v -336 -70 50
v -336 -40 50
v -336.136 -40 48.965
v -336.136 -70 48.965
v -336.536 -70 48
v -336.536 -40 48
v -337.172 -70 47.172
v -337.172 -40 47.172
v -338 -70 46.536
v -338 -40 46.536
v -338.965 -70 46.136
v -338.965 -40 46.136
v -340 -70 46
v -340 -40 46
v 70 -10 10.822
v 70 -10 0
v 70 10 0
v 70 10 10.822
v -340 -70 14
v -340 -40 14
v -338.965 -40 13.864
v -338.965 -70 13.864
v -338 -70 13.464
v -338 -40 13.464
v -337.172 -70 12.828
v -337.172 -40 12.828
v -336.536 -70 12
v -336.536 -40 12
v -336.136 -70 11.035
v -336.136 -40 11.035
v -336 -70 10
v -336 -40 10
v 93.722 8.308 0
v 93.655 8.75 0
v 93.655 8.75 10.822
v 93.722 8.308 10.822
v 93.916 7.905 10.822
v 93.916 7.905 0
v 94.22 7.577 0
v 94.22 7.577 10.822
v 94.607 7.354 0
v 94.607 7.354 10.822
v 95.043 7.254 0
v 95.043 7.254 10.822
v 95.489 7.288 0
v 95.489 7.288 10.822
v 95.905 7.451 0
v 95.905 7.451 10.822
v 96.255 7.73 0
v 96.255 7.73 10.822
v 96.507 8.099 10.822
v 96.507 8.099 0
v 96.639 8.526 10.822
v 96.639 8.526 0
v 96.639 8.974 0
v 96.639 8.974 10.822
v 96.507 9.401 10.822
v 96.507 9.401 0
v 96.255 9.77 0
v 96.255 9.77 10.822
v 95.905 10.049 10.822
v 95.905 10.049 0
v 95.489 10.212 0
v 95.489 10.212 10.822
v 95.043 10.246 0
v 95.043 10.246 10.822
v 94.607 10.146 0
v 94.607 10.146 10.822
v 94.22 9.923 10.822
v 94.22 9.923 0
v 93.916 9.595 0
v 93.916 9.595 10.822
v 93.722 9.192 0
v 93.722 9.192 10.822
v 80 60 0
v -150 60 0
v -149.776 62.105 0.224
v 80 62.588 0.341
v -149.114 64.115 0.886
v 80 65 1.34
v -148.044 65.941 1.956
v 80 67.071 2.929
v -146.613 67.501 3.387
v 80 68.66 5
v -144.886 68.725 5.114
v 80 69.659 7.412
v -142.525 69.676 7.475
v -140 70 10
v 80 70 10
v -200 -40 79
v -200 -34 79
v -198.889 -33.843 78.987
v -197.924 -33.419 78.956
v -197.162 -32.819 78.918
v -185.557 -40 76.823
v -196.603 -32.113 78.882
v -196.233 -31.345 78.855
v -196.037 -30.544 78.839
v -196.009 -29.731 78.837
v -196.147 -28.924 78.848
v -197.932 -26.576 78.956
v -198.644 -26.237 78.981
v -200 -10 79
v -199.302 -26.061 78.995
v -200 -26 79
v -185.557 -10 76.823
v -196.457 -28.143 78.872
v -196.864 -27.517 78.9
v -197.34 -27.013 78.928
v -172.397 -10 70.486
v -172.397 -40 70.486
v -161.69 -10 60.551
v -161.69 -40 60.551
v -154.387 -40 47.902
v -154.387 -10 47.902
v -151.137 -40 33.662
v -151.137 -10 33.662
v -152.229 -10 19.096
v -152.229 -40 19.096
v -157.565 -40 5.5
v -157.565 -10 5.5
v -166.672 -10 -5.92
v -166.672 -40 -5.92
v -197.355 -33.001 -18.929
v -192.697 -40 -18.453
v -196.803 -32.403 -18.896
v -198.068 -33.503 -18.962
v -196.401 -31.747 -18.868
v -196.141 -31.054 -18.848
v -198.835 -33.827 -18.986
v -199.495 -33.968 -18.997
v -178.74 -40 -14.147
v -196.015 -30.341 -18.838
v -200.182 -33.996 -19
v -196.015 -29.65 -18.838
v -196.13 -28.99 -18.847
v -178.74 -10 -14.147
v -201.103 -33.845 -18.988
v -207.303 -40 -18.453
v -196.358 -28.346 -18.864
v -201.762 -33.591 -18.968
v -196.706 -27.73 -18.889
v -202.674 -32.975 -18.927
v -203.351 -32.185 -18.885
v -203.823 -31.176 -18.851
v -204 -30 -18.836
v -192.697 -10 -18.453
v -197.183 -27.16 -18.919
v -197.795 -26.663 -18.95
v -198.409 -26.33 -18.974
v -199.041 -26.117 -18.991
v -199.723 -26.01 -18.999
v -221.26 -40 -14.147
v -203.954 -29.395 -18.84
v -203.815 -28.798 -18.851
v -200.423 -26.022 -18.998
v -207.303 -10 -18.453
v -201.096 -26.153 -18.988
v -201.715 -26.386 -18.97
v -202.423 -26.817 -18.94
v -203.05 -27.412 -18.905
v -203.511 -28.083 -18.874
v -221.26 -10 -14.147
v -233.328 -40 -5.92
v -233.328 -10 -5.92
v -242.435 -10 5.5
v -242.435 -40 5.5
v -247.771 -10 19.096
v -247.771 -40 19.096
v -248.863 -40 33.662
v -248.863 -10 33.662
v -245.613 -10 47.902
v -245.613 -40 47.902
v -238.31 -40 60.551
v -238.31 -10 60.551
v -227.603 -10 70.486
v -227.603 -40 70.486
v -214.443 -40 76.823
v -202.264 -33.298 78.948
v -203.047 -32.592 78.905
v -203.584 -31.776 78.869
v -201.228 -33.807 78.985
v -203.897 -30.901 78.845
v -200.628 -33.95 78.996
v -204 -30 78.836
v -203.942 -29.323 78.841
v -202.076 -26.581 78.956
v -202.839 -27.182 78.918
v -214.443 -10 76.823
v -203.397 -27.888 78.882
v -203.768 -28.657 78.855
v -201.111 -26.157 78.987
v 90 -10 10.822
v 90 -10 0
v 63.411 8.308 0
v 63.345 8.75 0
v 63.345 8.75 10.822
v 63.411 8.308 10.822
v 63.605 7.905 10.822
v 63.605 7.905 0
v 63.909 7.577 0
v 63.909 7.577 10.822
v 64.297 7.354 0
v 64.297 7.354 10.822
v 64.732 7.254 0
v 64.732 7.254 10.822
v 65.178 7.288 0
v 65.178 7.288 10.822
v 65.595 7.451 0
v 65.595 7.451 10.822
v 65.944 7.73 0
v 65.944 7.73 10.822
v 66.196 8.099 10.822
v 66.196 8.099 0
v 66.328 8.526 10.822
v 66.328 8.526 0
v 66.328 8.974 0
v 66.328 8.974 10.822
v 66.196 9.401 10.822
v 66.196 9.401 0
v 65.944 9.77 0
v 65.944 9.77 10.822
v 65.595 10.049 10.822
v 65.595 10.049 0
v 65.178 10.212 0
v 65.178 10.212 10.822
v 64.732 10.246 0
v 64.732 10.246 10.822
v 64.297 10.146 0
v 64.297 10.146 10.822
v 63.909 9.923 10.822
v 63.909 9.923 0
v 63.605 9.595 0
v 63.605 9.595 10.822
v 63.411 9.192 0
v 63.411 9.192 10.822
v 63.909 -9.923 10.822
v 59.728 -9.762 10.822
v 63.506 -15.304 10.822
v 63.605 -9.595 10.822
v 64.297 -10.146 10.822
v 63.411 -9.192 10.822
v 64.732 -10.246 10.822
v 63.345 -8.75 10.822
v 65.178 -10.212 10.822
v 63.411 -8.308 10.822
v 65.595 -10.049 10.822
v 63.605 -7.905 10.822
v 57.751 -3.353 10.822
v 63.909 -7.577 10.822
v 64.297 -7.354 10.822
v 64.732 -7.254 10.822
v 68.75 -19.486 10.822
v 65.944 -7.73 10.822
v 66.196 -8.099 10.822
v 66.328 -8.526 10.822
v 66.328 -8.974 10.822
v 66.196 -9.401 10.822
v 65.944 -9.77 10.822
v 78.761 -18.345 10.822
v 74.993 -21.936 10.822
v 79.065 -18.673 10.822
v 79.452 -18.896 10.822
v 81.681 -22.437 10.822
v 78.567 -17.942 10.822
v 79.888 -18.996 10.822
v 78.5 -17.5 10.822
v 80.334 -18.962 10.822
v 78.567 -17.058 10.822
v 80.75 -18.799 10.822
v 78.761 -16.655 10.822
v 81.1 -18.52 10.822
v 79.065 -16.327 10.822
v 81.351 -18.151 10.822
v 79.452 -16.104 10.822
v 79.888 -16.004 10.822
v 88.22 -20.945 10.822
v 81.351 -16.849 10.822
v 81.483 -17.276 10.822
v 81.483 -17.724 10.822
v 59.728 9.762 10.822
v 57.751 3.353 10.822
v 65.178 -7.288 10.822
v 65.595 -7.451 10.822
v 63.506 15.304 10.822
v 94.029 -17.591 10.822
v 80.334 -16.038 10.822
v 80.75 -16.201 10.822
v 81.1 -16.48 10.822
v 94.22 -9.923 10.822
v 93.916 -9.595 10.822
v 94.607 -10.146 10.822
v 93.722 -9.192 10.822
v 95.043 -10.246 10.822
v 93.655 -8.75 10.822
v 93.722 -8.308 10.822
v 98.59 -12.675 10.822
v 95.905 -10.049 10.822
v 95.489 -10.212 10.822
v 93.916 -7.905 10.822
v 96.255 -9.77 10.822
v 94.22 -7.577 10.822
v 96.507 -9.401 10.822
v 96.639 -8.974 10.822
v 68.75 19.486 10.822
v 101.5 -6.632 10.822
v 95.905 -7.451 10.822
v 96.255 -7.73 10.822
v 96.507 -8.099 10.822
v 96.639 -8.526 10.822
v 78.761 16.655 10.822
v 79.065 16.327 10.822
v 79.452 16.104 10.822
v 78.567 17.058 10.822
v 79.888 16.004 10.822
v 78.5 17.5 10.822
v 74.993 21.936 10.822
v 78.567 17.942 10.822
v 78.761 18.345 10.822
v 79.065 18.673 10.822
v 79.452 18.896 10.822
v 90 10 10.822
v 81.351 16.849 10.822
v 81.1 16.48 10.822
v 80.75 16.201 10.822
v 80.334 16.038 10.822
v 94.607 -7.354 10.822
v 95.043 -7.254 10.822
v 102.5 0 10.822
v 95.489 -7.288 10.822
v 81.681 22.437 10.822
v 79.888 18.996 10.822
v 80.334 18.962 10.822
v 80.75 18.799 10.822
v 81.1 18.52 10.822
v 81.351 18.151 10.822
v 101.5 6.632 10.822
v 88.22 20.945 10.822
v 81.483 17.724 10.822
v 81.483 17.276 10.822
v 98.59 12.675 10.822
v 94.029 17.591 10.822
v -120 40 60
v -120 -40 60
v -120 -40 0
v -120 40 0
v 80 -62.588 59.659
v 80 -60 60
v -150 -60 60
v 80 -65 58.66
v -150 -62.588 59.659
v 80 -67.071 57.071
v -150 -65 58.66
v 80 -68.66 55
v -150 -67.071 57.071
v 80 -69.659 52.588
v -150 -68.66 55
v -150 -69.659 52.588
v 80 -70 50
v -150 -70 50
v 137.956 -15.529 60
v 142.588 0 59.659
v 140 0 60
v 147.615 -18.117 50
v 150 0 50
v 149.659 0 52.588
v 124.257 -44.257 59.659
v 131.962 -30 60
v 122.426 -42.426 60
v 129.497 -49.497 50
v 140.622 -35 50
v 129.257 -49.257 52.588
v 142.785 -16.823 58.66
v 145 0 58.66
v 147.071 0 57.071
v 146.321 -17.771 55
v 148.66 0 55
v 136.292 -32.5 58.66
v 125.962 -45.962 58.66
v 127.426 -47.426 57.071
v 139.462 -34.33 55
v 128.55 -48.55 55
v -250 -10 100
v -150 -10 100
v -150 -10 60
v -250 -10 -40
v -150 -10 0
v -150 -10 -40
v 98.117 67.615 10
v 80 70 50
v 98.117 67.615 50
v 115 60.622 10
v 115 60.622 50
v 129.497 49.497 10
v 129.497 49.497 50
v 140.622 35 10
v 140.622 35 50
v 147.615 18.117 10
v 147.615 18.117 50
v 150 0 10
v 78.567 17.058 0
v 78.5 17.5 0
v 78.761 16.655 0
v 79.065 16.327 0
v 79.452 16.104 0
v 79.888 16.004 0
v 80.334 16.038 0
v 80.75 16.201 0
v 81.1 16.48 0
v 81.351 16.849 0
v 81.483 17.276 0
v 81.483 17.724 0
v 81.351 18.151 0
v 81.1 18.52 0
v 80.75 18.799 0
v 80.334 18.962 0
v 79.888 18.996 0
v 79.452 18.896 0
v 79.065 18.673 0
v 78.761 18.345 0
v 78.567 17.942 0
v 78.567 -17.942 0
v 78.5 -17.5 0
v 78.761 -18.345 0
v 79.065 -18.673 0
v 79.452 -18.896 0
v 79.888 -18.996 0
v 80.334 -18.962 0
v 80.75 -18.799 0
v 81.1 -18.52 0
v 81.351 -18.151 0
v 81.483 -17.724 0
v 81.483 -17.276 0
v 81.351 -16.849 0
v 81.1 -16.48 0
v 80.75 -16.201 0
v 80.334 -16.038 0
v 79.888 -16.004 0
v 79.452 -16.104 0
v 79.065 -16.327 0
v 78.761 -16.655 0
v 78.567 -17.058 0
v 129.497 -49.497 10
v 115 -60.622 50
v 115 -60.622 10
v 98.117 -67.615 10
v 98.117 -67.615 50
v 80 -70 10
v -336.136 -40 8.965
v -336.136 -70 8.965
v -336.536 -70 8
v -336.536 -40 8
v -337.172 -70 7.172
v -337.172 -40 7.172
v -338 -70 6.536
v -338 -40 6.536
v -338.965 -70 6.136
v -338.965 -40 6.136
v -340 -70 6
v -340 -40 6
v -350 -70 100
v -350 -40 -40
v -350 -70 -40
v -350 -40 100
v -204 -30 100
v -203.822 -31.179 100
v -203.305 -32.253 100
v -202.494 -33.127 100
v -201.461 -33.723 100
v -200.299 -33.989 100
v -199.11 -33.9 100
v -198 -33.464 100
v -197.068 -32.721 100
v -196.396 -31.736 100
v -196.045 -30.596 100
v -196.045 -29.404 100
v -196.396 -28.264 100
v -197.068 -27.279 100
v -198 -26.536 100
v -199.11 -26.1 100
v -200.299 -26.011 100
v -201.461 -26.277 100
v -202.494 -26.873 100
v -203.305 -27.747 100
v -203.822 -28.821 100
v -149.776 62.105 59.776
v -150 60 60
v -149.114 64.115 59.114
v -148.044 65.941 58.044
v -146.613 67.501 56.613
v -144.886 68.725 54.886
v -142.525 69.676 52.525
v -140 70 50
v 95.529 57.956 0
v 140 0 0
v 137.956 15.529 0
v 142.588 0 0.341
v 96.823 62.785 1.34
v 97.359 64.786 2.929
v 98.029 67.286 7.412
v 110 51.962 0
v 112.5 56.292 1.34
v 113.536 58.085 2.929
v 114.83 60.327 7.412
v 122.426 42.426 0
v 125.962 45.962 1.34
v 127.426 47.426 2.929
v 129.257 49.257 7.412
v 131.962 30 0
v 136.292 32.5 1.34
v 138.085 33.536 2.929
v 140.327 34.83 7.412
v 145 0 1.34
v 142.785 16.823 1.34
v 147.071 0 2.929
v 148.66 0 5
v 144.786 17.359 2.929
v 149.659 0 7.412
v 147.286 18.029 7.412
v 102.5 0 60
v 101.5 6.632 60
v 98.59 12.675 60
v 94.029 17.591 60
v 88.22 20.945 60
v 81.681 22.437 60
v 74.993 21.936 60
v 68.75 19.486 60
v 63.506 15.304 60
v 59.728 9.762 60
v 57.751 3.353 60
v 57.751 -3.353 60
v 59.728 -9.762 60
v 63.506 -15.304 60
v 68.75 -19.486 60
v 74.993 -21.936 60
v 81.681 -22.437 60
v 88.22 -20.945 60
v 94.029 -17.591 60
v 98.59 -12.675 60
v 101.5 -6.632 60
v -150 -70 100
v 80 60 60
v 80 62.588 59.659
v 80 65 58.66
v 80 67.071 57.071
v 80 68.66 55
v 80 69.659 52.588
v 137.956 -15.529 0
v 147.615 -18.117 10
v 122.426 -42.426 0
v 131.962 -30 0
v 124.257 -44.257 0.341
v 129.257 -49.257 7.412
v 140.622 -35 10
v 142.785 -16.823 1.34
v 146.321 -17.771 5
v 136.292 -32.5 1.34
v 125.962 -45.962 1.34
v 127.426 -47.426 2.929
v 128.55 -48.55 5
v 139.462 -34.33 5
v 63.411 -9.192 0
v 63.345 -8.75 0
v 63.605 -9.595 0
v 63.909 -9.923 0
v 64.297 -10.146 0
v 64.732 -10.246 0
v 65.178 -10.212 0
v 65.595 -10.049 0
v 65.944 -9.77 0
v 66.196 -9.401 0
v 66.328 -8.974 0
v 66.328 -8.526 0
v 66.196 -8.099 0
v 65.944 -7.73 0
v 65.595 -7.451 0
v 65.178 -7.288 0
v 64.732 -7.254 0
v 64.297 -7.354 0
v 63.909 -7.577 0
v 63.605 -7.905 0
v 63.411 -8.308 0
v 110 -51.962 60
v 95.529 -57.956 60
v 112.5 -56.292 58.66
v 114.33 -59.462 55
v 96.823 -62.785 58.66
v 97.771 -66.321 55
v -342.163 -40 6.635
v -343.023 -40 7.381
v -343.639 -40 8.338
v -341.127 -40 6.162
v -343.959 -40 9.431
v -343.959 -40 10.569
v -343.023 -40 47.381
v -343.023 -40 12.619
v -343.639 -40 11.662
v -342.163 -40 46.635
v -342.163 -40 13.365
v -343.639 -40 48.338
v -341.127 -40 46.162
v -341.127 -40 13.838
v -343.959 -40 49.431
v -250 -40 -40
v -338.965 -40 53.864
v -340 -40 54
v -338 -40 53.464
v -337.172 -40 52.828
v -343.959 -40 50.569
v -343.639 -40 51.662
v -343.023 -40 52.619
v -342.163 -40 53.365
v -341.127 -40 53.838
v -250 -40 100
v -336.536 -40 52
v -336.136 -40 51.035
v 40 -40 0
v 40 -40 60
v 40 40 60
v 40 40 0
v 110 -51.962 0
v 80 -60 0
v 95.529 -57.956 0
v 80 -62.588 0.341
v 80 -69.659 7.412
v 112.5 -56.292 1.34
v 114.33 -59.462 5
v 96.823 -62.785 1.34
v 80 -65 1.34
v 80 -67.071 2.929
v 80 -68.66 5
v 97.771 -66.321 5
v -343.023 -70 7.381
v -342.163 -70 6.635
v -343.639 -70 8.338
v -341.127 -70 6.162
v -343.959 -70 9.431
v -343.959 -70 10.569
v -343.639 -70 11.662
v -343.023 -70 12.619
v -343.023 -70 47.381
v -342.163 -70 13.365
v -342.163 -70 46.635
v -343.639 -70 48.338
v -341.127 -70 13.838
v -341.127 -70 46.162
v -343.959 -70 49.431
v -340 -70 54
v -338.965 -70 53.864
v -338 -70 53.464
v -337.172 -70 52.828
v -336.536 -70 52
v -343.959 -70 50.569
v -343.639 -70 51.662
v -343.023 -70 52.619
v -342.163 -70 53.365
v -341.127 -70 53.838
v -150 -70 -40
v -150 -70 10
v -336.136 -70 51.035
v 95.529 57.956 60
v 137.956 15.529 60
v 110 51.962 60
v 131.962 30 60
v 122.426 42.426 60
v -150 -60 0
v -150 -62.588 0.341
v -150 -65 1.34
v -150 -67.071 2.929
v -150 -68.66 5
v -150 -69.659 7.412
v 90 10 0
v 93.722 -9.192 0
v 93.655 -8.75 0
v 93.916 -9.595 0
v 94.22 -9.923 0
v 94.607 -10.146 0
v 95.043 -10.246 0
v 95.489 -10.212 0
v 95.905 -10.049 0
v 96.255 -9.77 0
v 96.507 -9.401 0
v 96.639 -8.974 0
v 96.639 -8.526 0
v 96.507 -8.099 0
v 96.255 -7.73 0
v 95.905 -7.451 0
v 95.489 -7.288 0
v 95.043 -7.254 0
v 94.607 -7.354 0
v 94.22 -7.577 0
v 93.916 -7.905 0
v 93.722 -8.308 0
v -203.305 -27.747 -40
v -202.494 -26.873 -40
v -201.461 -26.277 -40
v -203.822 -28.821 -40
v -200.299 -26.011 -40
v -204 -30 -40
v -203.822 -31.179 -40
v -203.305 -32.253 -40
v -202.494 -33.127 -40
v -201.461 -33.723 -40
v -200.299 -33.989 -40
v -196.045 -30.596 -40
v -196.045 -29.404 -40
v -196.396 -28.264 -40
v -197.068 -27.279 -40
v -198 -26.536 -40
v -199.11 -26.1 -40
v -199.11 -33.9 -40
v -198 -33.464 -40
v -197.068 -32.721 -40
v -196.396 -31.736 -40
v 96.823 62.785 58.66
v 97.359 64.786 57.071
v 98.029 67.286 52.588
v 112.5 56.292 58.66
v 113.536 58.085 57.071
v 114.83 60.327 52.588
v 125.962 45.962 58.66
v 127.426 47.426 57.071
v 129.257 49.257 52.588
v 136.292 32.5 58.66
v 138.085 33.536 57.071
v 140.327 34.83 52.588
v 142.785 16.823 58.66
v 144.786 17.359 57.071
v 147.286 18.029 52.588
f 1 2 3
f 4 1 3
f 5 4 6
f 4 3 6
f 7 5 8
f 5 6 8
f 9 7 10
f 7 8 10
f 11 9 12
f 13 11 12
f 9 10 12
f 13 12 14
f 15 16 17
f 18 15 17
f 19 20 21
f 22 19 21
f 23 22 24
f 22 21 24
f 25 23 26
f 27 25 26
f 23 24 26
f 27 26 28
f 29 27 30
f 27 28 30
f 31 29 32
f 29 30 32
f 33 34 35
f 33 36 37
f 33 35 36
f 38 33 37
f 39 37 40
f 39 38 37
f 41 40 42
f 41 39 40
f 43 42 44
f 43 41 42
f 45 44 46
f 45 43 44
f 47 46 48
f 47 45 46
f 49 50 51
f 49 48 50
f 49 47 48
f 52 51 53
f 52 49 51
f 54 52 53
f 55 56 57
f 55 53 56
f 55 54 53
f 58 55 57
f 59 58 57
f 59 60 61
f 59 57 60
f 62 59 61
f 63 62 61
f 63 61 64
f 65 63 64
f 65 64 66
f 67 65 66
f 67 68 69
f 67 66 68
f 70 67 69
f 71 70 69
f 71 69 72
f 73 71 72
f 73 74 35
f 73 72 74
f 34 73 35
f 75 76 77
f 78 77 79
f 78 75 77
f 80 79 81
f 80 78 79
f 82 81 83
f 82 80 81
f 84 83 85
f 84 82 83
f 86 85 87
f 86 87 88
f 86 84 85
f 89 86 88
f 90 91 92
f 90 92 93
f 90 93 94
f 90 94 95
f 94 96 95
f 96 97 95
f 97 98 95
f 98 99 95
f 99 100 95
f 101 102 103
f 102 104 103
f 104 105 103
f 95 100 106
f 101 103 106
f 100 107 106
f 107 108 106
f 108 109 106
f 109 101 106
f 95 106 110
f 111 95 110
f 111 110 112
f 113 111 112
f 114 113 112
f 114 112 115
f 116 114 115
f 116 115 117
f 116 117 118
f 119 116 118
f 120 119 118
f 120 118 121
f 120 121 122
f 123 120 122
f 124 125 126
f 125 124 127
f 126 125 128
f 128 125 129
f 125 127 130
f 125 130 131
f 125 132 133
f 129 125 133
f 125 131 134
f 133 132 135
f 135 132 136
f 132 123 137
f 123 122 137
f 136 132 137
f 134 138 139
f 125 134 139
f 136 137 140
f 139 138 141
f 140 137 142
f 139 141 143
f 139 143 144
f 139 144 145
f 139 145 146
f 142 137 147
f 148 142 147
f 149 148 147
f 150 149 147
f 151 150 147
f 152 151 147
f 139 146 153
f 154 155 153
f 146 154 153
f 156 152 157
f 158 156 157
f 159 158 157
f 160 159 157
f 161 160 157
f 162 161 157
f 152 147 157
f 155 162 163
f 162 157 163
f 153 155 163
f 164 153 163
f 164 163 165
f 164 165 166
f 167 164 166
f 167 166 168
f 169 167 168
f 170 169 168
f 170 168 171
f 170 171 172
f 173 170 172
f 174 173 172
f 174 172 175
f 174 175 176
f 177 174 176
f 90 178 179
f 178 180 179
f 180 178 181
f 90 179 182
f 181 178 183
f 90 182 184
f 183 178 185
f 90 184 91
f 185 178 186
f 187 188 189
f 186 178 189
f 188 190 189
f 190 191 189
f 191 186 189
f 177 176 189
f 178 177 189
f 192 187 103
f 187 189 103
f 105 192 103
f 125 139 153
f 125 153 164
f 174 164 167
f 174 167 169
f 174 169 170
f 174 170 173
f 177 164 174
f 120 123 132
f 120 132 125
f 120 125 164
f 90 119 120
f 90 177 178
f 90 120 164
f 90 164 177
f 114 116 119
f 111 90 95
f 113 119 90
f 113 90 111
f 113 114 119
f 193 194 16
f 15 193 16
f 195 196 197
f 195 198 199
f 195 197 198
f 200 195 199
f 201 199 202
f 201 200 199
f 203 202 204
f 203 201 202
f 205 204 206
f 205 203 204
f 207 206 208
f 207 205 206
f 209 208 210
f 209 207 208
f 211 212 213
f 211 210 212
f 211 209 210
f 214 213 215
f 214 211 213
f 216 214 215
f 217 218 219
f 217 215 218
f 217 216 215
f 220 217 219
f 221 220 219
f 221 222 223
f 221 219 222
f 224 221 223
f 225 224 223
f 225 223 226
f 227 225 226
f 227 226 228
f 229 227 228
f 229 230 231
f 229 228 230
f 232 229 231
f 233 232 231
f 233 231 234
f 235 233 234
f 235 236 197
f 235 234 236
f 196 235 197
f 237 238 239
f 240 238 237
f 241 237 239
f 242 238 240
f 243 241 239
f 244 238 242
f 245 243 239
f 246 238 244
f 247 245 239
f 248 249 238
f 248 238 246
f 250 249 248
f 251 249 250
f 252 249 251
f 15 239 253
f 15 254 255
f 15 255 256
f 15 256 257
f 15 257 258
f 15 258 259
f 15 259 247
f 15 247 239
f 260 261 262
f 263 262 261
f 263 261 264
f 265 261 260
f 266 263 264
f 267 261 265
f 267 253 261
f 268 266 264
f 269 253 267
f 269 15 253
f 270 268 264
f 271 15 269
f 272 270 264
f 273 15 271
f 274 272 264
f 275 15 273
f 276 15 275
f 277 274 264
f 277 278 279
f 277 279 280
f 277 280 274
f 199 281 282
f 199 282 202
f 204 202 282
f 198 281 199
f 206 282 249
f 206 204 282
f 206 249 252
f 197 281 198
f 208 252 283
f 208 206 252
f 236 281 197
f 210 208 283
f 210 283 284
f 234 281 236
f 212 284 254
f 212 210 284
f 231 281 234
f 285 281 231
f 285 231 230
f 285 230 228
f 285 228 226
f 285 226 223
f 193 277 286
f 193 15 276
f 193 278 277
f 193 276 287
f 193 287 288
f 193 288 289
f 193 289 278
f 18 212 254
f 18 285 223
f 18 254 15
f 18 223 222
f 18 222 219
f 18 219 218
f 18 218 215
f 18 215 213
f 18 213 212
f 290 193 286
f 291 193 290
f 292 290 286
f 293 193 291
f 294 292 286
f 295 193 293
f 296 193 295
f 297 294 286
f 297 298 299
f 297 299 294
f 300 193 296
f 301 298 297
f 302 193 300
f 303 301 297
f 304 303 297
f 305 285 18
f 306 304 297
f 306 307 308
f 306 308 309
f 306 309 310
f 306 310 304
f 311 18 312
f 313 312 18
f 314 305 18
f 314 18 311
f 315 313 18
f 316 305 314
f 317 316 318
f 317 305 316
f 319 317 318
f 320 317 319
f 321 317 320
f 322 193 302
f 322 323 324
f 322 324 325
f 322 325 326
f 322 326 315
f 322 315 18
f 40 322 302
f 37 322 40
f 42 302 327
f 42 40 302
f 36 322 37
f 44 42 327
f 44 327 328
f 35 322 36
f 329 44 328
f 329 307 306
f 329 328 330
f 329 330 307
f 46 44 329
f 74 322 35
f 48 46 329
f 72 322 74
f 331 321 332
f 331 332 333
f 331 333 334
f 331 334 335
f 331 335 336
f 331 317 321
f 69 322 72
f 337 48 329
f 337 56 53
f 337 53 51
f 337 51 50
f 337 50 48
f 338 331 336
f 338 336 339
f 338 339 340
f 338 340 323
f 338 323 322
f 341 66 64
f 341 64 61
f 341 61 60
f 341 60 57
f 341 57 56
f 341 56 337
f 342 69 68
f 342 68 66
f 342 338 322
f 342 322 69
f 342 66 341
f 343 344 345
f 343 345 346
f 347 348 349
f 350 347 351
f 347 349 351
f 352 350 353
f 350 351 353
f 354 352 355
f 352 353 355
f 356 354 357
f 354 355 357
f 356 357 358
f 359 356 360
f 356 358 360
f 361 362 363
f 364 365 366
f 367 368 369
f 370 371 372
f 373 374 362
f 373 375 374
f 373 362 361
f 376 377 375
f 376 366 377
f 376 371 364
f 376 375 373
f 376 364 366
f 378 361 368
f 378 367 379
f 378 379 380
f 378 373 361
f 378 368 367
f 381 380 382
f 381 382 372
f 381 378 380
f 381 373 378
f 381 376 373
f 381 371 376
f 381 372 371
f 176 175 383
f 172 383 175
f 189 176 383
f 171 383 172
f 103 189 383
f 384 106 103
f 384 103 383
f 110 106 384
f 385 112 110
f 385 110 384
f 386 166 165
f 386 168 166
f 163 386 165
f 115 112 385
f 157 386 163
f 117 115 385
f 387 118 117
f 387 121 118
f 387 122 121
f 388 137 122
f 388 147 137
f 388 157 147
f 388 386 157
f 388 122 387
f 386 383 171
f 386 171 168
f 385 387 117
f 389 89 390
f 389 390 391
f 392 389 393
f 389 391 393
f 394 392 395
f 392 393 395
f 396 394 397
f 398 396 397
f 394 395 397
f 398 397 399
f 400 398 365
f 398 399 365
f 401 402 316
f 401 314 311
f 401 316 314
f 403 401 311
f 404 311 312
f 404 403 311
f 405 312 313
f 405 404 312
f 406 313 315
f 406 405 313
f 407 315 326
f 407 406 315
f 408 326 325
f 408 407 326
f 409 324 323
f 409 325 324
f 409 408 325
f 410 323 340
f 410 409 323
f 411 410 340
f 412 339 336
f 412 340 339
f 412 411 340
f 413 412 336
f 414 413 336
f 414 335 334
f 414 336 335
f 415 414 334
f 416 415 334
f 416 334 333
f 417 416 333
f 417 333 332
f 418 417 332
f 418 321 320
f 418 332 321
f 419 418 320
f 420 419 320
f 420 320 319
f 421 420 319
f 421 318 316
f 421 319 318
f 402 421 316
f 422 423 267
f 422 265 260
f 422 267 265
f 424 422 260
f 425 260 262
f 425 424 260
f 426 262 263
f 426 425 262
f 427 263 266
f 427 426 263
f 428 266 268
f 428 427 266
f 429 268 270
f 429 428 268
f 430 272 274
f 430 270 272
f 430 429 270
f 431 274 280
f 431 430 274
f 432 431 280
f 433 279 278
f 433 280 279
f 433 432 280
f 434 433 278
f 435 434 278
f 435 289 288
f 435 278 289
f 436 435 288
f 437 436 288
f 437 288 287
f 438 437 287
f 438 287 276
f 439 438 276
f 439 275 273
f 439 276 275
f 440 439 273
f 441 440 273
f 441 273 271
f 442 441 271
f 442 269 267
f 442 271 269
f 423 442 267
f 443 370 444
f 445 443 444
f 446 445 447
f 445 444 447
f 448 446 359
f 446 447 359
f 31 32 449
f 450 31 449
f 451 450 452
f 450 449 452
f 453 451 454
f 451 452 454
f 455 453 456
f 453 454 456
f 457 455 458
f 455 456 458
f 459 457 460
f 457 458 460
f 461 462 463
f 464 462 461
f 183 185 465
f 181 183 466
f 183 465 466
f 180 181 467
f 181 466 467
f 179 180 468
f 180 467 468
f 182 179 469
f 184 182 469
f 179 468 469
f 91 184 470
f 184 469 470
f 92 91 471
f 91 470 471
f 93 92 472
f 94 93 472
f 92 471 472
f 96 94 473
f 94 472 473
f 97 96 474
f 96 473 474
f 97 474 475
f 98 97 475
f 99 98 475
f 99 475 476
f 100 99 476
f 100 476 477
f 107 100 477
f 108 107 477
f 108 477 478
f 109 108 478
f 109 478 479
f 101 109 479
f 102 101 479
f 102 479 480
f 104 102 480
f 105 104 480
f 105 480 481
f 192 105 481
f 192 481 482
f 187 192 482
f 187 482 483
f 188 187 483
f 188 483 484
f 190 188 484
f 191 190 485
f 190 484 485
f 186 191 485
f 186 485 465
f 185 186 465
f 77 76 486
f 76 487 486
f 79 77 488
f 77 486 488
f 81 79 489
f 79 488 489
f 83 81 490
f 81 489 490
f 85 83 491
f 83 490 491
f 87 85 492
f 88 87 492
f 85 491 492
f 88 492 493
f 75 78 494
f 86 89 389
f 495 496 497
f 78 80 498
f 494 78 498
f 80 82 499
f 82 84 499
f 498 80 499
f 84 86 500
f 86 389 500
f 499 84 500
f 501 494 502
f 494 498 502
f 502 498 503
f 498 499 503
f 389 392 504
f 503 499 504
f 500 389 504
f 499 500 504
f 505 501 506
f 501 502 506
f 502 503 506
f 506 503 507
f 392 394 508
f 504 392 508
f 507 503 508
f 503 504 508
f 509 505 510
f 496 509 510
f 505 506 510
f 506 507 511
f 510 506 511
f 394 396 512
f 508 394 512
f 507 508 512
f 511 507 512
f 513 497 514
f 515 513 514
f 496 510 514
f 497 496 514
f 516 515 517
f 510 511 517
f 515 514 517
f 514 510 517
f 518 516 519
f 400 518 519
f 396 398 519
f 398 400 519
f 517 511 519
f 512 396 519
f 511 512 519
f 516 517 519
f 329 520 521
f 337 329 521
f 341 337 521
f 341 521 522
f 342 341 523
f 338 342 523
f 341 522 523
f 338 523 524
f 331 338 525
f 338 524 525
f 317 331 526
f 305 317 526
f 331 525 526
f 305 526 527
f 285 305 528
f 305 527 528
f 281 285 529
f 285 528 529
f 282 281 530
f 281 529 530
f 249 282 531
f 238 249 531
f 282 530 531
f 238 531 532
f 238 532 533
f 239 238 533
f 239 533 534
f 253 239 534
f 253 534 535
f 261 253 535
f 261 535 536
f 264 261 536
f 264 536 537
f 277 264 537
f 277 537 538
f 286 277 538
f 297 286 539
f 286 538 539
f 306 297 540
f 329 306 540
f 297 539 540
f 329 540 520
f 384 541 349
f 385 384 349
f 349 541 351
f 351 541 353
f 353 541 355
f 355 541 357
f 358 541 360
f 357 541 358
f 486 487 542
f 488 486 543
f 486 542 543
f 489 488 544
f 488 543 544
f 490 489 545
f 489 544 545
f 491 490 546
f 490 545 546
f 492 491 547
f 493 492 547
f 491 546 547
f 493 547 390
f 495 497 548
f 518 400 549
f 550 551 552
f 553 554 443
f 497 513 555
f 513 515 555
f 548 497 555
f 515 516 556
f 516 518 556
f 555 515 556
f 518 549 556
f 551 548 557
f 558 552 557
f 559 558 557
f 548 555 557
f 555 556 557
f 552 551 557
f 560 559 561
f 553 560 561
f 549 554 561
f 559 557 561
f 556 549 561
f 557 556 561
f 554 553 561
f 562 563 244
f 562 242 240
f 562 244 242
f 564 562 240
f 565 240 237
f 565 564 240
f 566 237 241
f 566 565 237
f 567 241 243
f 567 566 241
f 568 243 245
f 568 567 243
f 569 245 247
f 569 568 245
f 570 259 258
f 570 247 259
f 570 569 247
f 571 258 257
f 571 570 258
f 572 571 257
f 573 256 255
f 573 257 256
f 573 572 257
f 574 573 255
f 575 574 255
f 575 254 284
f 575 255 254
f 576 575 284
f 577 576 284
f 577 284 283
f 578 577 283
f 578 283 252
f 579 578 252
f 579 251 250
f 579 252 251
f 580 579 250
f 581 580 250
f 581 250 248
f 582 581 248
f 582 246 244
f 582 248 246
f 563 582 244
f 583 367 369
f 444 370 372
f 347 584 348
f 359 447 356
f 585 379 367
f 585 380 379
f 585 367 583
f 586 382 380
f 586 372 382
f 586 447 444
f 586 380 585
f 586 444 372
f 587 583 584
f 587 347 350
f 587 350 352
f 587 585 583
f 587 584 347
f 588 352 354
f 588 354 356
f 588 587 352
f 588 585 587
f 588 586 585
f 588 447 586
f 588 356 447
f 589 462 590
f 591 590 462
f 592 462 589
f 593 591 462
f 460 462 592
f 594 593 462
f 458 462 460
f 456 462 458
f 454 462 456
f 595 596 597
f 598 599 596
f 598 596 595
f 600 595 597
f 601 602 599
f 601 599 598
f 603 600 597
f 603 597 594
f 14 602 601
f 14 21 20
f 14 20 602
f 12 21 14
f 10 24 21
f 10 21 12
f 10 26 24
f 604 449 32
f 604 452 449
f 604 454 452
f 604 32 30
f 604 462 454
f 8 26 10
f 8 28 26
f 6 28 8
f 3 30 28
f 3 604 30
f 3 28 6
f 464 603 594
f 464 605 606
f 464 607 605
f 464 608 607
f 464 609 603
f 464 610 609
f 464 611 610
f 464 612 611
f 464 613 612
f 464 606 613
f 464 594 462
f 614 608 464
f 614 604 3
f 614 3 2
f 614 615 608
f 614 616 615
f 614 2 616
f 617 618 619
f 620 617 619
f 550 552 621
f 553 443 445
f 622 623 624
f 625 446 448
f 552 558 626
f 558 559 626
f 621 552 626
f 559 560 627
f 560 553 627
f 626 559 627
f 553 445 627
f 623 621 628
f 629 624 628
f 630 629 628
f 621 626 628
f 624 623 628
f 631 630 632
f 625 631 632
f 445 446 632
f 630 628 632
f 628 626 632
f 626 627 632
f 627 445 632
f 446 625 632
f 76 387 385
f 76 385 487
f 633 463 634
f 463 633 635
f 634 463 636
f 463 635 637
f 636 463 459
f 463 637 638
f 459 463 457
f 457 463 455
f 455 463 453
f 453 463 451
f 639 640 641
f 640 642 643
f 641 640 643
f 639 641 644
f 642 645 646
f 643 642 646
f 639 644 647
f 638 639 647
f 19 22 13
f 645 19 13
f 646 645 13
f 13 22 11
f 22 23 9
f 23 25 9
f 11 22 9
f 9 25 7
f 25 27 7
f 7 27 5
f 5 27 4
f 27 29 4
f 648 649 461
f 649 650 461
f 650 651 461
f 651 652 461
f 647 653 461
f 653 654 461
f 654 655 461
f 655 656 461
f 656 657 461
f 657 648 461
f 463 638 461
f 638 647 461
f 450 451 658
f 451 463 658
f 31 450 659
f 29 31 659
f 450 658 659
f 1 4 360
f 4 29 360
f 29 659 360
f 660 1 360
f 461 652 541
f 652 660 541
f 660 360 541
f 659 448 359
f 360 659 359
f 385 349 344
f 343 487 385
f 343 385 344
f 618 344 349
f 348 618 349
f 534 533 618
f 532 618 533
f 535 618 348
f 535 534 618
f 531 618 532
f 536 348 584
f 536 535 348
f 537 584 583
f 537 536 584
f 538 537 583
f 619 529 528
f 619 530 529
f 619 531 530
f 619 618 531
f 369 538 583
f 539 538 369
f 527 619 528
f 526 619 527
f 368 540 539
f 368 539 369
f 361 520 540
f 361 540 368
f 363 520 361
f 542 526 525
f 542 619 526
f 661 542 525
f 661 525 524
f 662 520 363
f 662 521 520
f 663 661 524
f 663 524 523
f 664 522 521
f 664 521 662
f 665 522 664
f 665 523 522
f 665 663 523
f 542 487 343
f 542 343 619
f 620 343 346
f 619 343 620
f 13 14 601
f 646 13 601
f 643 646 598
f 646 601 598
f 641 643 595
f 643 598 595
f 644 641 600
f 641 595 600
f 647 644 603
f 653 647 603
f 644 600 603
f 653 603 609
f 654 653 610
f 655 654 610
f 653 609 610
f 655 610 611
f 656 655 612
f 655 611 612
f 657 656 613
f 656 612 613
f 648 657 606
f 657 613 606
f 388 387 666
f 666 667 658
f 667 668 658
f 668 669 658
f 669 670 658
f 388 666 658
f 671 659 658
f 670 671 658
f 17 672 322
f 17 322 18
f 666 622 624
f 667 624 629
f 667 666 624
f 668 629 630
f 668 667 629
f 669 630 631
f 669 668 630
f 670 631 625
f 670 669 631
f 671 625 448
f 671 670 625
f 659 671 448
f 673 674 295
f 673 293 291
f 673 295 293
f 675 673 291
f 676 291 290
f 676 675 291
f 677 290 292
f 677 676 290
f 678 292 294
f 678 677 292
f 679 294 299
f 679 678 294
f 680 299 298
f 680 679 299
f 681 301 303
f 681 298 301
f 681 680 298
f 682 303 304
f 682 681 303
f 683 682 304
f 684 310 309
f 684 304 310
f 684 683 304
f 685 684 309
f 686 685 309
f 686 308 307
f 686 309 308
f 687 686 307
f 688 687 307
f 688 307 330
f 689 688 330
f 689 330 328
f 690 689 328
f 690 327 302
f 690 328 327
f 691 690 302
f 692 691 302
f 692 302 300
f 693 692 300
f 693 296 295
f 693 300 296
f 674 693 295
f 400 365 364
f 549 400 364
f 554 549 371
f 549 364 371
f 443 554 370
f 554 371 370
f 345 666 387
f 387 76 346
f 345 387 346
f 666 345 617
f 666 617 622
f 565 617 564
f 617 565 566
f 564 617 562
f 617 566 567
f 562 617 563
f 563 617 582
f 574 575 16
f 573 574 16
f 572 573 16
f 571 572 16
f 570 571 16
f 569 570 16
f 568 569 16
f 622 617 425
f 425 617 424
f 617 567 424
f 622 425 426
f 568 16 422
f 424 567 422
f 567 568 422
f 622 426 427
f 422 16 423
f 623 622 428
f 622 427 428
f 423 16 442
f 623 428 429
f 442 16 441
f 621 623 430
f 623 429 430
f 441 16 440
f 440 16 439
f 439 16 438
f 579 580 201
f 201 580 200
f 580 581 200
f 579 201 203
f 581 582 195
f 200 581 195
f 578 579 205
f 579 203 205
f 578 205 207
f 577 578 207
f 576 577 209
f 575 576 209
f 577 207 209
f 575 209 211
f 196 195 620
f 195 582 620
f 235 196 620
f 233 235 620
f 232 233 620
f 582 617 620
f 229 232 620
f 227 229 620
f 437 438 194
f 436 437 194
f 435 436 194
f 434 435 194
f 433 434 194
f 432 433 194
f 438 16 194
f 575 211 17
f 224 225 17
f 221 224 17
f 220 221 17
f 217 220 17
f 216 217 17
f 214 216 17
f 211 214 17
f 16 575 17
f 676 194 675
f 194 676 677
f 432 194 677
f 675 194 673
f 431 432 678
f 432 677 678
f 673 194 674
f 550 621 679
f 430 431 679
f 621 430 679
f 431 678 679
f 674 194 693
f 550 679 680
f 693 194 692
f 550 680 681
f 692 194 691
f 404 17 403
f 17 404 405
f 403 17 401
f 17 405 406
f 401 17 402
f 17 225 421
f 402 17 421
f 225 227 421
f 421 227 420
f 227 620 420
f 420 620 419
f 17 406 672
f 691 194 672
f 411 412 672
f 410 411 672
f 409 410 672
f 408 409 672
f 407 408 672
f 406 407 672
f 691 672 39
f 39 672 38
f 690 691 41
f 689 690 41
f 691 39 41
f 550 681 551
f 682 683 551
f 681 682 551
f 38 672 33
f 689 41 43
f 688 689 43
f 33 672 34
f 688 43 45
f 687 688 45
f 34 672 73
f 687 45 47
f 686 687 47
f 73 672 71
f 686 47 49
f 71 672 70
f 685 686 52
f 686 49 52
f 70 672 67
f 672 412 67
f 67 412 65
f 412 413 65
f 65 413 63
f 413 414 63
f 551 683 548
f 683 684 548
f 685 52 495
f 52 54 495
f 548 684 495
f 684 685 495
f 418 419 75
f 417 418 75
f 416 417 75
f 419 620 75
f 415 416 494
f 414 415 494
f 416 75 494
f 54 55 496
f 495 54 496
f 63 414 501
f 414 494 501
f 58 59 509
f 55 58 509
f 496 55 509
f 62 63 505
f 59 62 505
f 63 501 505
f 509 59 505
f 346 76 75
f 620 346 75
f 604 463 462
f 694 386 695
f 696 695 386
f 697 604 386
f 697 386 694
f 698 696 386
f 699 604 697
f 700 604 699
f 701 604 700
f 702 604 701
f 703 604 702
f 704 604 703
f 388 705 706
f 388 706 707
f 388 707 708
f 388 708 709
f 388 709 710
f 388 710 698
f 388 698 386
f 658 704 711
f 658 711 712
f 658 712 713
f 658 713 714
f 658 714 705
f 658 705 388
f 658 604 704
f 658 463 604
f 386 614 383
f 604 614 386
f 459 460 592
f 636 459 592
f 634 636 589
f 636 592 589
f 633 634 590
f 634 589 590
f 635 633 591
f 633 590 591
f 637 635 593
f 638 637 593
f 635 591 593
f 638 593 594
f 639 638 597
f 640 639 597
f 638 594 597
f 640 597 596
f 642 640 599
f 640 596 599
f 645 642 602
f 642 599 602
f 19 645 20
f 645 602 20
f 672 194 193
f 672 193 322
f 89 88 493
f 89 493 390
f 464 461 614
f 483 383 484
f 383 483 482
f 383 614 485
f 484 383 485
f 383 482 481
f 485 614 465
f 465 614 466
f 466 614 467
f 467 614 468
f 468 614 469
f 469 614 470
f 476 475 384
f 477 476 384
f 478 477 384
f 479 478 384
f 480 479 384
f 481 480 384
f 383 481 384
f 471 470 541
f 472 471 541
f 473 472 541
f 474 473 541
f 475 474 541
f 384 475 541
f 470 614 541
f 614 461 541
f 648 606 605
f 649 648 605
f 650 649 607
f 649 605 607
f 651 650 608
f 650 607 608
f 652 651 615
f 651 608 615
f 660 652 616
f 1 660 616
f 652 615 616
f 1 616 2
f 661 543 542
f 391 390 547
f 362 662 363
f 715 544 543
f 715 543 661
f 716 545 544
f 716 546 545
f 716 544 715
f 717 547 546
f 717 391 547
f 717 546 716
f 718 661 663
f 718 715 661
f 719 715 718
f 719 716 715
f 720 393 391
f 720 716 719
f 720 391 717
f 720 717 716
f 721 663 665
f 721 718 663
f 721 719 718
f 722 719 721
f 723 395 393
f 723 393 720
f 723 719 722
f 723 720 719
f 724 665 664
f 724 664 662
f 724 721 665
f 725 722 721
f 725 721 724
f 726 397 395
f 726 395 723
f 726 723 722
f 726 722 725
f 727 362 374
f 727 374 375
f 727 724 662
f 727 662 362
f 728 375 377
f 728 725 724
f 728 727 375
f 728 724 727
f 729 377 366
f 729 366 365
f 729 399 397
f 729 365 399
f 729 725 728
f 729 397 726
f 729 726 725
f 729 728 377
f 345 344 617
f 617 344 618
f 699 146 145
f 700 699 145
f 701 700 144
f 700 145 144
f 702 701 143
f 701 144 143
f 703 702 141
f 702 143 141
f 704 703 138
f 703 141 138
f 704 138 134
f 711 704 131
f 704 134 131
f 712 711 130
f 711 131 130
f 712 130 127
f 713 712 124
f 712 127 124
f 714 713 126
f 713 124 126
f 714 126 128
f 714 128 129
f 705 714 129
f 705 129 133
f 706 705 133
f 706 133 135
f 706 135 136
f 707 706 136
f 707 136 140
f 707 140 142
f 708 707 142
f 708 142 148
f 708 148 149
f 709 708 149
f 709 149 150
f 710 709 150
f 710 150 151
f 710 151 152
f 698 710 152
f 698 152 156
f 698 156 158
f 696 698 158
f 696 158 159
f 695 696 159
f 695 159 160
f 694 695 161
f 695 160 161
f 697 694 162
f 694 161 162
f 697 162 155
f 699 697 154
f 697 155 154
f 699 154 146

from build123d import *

# Parameters (mm, degrees)
SKETCH_1_W               = 300
SKETCH_1_H               = 140
EXTRUDE_1_DEPTH          = 60
CUT_EXTRUDE_1_DEPTH      = 60
SKETCH_4_W               = 160
SKETCH_4_H               = 80
CUT_EXTRUDE_2_DEPTH      = 177.068168617
SKETCH_5_W               = 20
SKETCH_5_H               = 20
CUT_EXTRUDE_3_DEPTH      = 177.068168617
SKETCH_12_W              = 140
SKETCH_12_H              = 30
EXTRUDE_2_DEPTH          = 200
SKETCH_13_W              = 100
SKETCH_13_H              = 140
EXTRUDE_3_DEPTH          = 30
SKETCH_14_R              = 49
CUT_EXTRUDE_4_DEPTH      = 30
CUT_EXTRUDE_5_DEPTH      = 30
FILLET_3_R               = 10
SKETCH_17_R              = 22.5
CUT_EXTRUDE_6_DEPTH      = 49.178012217
CUT_EXTRUDE_7_DEPTH      = 368.903136522
CUT_EXTRUDE_7_DEPTH_BACK = 50
SKETCH_18_R              = 1.5
CUT_EXTRUDE_8_DEPTH      = 384.405790254


with BuildPart() as part:
    # 草图1 → 凸台-拉伸1 (new body)
    with BuildSketch(Plane.XY):
        Rectangle(SKETCH_1_W, SKETCH_1_H)
    extrude(amount=EXTRUDE_1_DEPTH)

    # 草图2 → 切除-拉伸1 (cut)
    with BuildSketch(Plane.XY.offset(60)):
        with BuildLine():
            Line((150, 0), (150, 70))
            Line((150, 70), (80, 70))
            ThreePointArc((80, 70), (129.497474683, 49.497474683), (150, 0))
        make_face()
        with BuildLine():
            Line((80, -70), (150, -70))
            Line((150, -70), (129.497474683, -49.497474683))
            ThreePointArc((129.497474683, -49.497474683), (106.787840266, -64.671567276), (80, -70))
        make_face()
        with BuildLine():
            Line((150, -70), (150, 0))
            ThreePointArc((150, 0), (144.671567276, -26.787840266), (129.497474683, -49.497474683))
            Line((129.497474683, -49.497474683), (150, -70))
        make_face()
    extrude(amount=-CUT_EXTRUDE_1_DEPTH, mode=Mode.SUBTRACT)

    # 草图4 → 切除-拉伸2 (cut, through all)
    with BuildSketch(Plane.XY.offset(60)):
        with Locations((-40, 0)):
            Rectangle(SKETCH_4_W, SKETCH_4_H)
    extrude(amount=-CUT_EXTRUDE_2_DEPTH, mode=Mode.SUBTRACT)

    # 草图5 → 切除-拉伸3 (cut, through all)
    with BuildSketch(Plane(origin=(0, 0, 0), x_dir=(-1, 0, 0), z_dir=(0, 0, -1))):
        with Locations((-80, 0)):
            Rectangle(SKETCH_5_W, SKETCH_5_H)
    extrude(amount=-CUT_EXTRUDE_3_DEPTH, mode=Mode.SUBTRACT)

    # 草图12 → 凸台-拉伸2 (add)
    with BuildSketch(Plane.ZY.offset(150)):
        with Locations((30, -55)):
            Rectangle(SKETCH_12_W, SKETCH_12_H)
    extrude(amount=EXTRUDE_2_DEPTH)

    # 草图13 → 凸台-拉伸3 (add)
    with BuildSketch(Plane(origin=(0, -40, 0), x_dir=(1, 0, 0), z_dir=(0, 1, 0))):
        with Locations((-200, -30)):
            Rectangle(SKETCH_13_W, SKETCH_13_H)
    extrude(amount=EXTRUDE_3_DEPTH)

    # 草图14 → 切除-拉伸4 (cut)
    with BuildSketch(Plane(origin=(0, -10, 0), x_dir=(1, 0, 0), z_dir=(0, 1, 0))):
        with Locations(Location((-200, -30, 0), (0, 0, 270))):
            Circle(SKETCH_14_R)
    extrude(amount=-CUT_EXTRUDE_4_DEPTH, mode=Mode.SUBTRACT)

    # 草图15 → 切除-拉伸5 (cut)
    with BuildSketch(Plane(origin=(0, -40, 0), x_dir=(1, 0, 0), z_dir=(0, 1, 0))):
        with BuildLine():
            ThreePointArc((-336, -50), (-337.171572875, -47.171572875), (-340, -46))
            Line((-340, -46), (-340, -54))
            ThreePointArc((-340, -54), (-337.171572875, -52.828427125), (-336, -50))
        make_face()
        with BuildLine():
            Line((-340, -54), (-340, -46))
            ThreePointArc((-340, -46), (-344, -50), (-340, -54))
        make_face()
        with BuildLine():
            ThreePointArc((-336, -10), (-337.171572875, -7.171572875), (-340, -6))
            Line((-340, -6), (-340, -14))
            ThreePointArc((-340, -14), (-337.171572875, -12.828427125), (-336, -10))
        make_face()
        with BuildLine():
            Line((-340, -14), (-340, -6))
            ThreePointArc((-340, -6), (-344, -10), (-340, -14))
        make_face()
    extrude(amount=-CUT_EXTRUDE_5_DEPTH, mode=Mode.SUBTRACT)

    # 圆角3
    fillet_3_edges = [part.edges().sort_by_distance(p)[0] for p in [
        (-35, 70, 0),
        (-35, 70, 60),
        (-35, -70, 60),
        (150, 0, 60),
        (150, 0, 0),
        (-35, -70, 0),
        (-150, 70, 30),
    ]]
    fillet(fillet_3_edges, radius=FILLET_3_R)

    # 草图17 → 切除-拉伸6 (cut)
    with BuildSketch(Plane.XY.offset(60)):
        with Locations((80, 0)):
            Circle(SKETCH_17_R)
    extrude(amount=-CUT_EXTRUDE_6_DEPTH, mode=Mode.SUBTRACT)

    # 草图18 → 切除-拉伸7 (cut, two sides: drawn at the far end of the back side and taken through both)
    with BuildSketch(Plane.XY.offset(10.821987783).offset(-CUT_EXTRUDE_7_DEPTH_BACK)):
        with Locations(Location((80, 17.5, 0), (0, 0, 180))):
            Circle(SKETCH_18_R)
        with Locations(Location((95.155444566, 8.75, 0), (0, 0, 180))):
            Circle(SKETCH_18_R)
        with Locations(Location((95.155444566, -8.75, 0), (0, 0, 180))):
            Circle(SKETCH_18_R)
        with Locations(Location((80, -17.5, 0), (0, 0, 180))):
            Circle(SKETCH_18_R)
        with Locations(Location((64.844555434, -8.75, 0), (0, 0, 180))):
            Circle(SKETCH_18_R)
        with Locations(Location((64.844555434, 8.75, 0), (0, 0, 180))):
            Circle(SKETCH_18_R)
    extrude(amount=CUT_EXTRUDE_7_DEPTH + CUT_EXTRUDE_7_DEPTH_BACK, mode=Mode.SUBTRACT)

    # 草图19 → 切除-拉伸8 (cut, through all)
    with BuildSketch(Plane.XY.offset(100)):
        with BuildLine():
            ThreePointArc((-196, -30), (-200, -26), (-204, -30))
            Line((-204, -30), (-196, -30))
        make_face()
        with BuildLine():
            Line((-196, -30), (-204, -30))
            ThreePointArc((-204, -30), (-200, -34), (-196, -30))
        make_face()
    extrude(amount=-CUT_EXTRUDE_8_DEPTH, mode=Mode.SUBTRACT)


solid = part.part
